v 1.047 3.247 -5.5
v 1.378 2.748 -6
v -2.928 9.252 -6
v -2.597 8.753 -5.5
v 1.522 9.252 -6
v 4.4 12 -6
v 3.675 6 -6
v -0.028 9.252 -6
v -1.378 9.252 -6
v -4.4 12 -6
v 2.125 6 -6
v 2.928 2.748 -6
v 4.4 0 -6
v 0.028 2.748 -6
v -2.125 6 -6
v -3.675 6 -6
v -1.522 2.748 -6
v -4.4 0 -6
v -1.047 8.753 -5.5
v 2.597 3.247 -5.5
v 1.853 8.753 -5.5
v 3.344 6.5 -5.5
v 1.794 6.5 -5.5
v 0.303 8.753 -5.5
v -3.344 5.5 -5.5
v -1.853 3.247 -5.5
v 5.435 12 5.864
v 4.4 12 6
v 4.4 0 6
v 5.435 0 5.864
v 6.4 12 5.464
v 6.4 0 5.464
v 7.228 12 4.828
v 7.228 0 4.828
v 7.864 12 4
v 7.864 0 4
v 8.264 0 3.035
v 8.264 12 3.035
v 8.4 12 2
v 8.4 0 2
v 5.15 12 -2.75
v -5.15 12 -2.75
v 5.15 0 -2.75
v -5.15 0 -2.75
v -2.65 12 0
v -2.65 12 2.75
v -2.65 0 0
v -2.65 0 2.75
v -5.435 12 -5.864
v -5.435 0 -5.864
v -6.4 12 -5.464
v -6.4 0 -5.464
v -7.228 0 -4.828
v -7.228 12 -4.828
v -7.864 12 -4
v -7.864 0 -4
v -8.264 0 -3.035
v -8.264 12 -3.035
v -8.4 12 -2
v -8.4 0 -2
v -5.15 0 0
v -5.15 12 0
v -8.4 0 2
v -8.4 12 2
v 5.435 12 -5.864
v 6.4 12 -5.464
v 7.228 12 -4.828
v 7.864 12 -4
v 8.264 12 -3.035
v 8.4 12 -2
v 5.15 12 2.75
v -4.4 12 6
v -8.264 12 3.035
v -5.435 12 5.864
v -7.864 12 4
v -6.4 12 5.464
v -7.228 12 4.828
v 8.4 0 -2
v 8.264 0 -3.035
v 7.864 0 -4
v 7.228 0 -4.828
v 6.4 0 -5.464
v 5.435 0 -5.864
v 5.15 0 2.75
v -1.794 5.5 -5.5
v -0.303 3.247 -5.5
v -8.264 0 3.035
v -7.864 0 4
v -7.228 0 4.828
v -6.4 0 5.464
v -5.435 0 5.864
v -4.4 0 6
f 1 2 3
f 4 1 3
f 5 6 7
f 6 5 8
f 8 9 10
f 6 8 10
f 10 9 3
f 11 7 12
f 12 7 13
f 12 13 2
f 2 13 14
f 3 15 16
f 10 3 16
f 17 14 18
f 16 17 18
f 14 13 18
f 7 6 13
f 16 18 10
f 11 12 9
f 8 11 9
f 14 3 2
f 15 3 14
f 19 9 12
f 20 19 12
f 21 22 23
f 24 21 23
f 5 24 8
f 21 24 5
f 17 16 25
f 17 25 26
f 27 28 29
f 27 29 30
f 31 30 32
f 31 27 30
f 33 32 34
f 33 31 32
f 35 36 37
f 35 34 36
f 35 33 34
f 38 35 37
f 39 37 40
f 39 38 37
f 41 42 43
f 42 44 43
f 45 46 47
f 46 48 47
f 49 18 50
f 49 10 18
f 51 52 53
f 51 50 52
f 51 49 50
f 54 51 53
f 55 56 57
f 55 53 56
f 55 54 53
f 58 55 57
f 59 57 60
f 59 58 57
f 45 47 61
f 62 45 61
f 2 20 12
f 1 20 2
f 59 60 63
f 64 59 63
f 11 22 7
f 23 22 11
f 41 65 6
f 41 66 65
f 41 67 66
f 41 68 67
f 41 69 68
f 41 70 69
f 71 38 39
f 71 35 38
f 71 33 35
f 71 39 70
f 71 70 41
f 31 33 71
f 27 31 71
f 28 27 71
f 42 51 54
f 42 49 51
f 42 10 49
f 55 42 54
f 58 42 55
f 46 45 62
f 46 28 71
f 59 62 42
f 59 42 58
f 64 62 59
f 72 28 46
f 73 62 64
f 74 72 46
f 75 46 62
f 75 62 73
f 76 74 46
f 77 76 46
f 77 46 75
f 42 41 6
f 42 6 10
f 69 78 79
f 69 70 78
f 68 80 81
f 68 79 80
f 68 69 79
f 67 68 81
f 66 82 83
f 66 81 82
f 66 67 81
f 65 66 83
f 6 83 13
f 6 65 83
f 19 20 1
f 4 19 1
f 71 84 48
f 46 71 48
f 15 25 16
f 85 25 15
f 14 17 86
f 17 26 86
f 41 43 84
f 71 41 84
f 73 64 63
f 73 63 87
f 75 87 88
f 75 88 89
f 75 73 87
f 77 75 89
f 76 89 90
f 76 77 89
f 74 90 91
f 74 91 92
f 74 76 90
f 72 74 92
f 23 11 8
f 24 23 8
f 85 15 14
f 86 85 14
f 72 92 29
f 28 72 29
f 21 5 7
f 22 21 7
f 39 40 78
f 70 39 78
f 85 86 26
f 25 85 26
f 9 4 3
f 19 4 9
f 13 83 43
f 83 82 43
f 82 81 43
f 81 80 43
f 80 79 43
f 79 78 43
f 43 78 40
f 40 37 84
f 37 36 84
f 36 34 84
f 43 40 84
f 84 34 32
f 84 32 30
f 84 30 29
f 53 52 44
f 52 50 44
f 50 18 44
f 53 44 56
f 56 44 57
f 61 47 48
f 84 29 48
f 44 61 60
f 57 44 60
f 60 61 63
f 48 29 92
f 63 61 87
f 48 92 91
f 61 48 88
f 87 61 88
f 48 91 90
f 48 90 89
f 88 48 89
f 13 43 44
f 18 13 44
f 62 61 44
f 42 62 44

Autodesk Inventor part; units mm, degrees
ref_plane "YZ Plane" through (0, 0, 0) normal (1, 0, 0) x (0, 1, 0)
ref_plane "XZ Plane" through (0, 0, 0) normal (0, 1, 0) x (-1, 0, 0)
ref_plane "XY Plane" through (0, 0, 0) normal (0, 0, 1) x (1, 0, 0)
sketch "Skizze1" plane through (0, 0, 0) normal (0, 1, 0) x (-1, 0, 0)
  line L0 (-5.15, 2.75) -> (2.65, 2.75)
  line L1 (2.65, 2.75) -> (2.65, 0)
  line L2 (2.65, 0) -> (5.15, 0)
  line L3 (5.15, 0) -> (5.15, -2.75)
  line L4 (5.15, -2.75) -> (-5.15, -2.75)
  line L5 (-5.15, -2.75) -> (-5.15, 2.75)
  line L6 (8.4, 6) -> (-8.4, 6)
  line L7 (-8.4, 6) -> (-8.4, -6)
  line L8 (-8.4, -6) -> (8.4, -6)
  line L9 (8.4, -6) -> (8.4, 6)
  line L10 (8.4, 6) -> (-8.4, -6) construction
  line L11 (-8.4, 6) -> (8.4, -6) construction
  point P0 (0, 0)
  point P1 (0, 0)
  dimension "d0" = 16.8
  dimension "d1" = 12
  dimension "d2" = 5.5
  dimension "d3" = 10.3
  dimension "d4" = 2.75
  dimension "d5" = 7.8
  dimension "d6" = 2.75
  dimension "d7" = 3.25
  dimension "d8" = 3.25
extrude "Extrusion1" add sketch "Skizze1" along normal blind 12
fillet "Rundung1" radius 4 4 edges at (8.4, 6, -6) (8.4, 6, 6) (-8.4, 6, -6) (-8.4, 6, 6)
sketch "Skizze3" plane through (4.4, 0, -6) normal (0, 0, -1) x (-1, 0, 0)
  line L0 (8.075, 6) -> (6.525, 6)
  line L1 (6.525, 6) -> (4.3724, 2.7478)
  line L2 (8.075, 6) -> (5.9224, 2.7478)
  line L3 (8.075, 6) -> (11.975, 6) construction
  line L4 (5.9224, 2.7478) -> (4.3724, 2.7478)
  line L5 (3.0224, 2.7478) -> (7.3276, 9.2522)
  line L6 (3.0224, 2.7478) -> (10.8224, 2.7478) construction
  line L7 (7.3276, 9.2522) -> (5.7776, 9.2522)
  line L8 (7.3276, 9.2522) -> (8.8776, 9.2522) construction
  line L9 (5.7776, 9.2522) -> (1.4724, 2.7478)
  line L10 (1.4724, 2.7478) -> (3.0224, 2.7478)
  line L11 (4.4276, 9.2522) -> (2.8776, 9.2522)
  line L12 (2.8776, 9.2522) -> (0.725, 6)
  line L13 (0.725, 6) -> (2.275, 6)
  line L14 (0.725, 6) -> (2.275, 6) construction
  line L15 (2.275, 6) -> (4.4276, 9.2522)
  line L16 (-4, 12) -> (-4, 0) projected
  line L17 (12.8, 0) -> (12.8, 12) projected
  line L18 (0, 12) -> (8.8, 12) projected
  line L19 (0, 0) -> (8.8, 0) projected
  point P0 (4.4, 0)
  point P1 (0, 12.9522)
  dimension "d21" = 3.9
  dimension "d22" = 123.5
  dimension "d23" = 3.9
  dimension "d24" = 123.5
  dimension "d25" = 7.8
  dimension "d26" = 56.5
  dimension "d27" = 1.55
  dimension "d28" = 1.55
  dimension "d29" = 1.55
  dimension "d30" = 180
  dimension "d31" = 123.5
  dimension "d32" = 1.55
  dimension "d33" = 3.9
  dimension "d34" = 123.5
  dimension "d35" = 1.55
  dimension "d36" = 0
  dimension "d37" = 1.35
  dimension "d38" = 1.35
  dimension "d39" = 7.35
  dimension "d42" = 3.7
  dimension "d43" = 0
  dimension "d50" = 4.725
  dimension "d51" = 4.725
  dimension "d52" = 2.7479
  dimension "d53" = 2.7479
extrude "Extrusion3" cut sketch "Skizze3" against normal blind 0.5
chamfer "Fase2" distance 0.5 angle 45 6 edges at (-2.1526, 9.2522, -5.5) (-2.9, 6, -5.5) (0.7474, 9.2522, -5.5) (2.9, 6, -5.5) (2.1526, 2.7478, -5.5) (-0.7474, 2.7478, -5.5)
equation "\"d0\" = d3 + 2 * d7"
equation "\"d7\" = d8"
equation "\"d37\" = d38"
equation "\"d50\" = d51"
equation "\"d52\" = d53"
properties part number "Plugholder"
